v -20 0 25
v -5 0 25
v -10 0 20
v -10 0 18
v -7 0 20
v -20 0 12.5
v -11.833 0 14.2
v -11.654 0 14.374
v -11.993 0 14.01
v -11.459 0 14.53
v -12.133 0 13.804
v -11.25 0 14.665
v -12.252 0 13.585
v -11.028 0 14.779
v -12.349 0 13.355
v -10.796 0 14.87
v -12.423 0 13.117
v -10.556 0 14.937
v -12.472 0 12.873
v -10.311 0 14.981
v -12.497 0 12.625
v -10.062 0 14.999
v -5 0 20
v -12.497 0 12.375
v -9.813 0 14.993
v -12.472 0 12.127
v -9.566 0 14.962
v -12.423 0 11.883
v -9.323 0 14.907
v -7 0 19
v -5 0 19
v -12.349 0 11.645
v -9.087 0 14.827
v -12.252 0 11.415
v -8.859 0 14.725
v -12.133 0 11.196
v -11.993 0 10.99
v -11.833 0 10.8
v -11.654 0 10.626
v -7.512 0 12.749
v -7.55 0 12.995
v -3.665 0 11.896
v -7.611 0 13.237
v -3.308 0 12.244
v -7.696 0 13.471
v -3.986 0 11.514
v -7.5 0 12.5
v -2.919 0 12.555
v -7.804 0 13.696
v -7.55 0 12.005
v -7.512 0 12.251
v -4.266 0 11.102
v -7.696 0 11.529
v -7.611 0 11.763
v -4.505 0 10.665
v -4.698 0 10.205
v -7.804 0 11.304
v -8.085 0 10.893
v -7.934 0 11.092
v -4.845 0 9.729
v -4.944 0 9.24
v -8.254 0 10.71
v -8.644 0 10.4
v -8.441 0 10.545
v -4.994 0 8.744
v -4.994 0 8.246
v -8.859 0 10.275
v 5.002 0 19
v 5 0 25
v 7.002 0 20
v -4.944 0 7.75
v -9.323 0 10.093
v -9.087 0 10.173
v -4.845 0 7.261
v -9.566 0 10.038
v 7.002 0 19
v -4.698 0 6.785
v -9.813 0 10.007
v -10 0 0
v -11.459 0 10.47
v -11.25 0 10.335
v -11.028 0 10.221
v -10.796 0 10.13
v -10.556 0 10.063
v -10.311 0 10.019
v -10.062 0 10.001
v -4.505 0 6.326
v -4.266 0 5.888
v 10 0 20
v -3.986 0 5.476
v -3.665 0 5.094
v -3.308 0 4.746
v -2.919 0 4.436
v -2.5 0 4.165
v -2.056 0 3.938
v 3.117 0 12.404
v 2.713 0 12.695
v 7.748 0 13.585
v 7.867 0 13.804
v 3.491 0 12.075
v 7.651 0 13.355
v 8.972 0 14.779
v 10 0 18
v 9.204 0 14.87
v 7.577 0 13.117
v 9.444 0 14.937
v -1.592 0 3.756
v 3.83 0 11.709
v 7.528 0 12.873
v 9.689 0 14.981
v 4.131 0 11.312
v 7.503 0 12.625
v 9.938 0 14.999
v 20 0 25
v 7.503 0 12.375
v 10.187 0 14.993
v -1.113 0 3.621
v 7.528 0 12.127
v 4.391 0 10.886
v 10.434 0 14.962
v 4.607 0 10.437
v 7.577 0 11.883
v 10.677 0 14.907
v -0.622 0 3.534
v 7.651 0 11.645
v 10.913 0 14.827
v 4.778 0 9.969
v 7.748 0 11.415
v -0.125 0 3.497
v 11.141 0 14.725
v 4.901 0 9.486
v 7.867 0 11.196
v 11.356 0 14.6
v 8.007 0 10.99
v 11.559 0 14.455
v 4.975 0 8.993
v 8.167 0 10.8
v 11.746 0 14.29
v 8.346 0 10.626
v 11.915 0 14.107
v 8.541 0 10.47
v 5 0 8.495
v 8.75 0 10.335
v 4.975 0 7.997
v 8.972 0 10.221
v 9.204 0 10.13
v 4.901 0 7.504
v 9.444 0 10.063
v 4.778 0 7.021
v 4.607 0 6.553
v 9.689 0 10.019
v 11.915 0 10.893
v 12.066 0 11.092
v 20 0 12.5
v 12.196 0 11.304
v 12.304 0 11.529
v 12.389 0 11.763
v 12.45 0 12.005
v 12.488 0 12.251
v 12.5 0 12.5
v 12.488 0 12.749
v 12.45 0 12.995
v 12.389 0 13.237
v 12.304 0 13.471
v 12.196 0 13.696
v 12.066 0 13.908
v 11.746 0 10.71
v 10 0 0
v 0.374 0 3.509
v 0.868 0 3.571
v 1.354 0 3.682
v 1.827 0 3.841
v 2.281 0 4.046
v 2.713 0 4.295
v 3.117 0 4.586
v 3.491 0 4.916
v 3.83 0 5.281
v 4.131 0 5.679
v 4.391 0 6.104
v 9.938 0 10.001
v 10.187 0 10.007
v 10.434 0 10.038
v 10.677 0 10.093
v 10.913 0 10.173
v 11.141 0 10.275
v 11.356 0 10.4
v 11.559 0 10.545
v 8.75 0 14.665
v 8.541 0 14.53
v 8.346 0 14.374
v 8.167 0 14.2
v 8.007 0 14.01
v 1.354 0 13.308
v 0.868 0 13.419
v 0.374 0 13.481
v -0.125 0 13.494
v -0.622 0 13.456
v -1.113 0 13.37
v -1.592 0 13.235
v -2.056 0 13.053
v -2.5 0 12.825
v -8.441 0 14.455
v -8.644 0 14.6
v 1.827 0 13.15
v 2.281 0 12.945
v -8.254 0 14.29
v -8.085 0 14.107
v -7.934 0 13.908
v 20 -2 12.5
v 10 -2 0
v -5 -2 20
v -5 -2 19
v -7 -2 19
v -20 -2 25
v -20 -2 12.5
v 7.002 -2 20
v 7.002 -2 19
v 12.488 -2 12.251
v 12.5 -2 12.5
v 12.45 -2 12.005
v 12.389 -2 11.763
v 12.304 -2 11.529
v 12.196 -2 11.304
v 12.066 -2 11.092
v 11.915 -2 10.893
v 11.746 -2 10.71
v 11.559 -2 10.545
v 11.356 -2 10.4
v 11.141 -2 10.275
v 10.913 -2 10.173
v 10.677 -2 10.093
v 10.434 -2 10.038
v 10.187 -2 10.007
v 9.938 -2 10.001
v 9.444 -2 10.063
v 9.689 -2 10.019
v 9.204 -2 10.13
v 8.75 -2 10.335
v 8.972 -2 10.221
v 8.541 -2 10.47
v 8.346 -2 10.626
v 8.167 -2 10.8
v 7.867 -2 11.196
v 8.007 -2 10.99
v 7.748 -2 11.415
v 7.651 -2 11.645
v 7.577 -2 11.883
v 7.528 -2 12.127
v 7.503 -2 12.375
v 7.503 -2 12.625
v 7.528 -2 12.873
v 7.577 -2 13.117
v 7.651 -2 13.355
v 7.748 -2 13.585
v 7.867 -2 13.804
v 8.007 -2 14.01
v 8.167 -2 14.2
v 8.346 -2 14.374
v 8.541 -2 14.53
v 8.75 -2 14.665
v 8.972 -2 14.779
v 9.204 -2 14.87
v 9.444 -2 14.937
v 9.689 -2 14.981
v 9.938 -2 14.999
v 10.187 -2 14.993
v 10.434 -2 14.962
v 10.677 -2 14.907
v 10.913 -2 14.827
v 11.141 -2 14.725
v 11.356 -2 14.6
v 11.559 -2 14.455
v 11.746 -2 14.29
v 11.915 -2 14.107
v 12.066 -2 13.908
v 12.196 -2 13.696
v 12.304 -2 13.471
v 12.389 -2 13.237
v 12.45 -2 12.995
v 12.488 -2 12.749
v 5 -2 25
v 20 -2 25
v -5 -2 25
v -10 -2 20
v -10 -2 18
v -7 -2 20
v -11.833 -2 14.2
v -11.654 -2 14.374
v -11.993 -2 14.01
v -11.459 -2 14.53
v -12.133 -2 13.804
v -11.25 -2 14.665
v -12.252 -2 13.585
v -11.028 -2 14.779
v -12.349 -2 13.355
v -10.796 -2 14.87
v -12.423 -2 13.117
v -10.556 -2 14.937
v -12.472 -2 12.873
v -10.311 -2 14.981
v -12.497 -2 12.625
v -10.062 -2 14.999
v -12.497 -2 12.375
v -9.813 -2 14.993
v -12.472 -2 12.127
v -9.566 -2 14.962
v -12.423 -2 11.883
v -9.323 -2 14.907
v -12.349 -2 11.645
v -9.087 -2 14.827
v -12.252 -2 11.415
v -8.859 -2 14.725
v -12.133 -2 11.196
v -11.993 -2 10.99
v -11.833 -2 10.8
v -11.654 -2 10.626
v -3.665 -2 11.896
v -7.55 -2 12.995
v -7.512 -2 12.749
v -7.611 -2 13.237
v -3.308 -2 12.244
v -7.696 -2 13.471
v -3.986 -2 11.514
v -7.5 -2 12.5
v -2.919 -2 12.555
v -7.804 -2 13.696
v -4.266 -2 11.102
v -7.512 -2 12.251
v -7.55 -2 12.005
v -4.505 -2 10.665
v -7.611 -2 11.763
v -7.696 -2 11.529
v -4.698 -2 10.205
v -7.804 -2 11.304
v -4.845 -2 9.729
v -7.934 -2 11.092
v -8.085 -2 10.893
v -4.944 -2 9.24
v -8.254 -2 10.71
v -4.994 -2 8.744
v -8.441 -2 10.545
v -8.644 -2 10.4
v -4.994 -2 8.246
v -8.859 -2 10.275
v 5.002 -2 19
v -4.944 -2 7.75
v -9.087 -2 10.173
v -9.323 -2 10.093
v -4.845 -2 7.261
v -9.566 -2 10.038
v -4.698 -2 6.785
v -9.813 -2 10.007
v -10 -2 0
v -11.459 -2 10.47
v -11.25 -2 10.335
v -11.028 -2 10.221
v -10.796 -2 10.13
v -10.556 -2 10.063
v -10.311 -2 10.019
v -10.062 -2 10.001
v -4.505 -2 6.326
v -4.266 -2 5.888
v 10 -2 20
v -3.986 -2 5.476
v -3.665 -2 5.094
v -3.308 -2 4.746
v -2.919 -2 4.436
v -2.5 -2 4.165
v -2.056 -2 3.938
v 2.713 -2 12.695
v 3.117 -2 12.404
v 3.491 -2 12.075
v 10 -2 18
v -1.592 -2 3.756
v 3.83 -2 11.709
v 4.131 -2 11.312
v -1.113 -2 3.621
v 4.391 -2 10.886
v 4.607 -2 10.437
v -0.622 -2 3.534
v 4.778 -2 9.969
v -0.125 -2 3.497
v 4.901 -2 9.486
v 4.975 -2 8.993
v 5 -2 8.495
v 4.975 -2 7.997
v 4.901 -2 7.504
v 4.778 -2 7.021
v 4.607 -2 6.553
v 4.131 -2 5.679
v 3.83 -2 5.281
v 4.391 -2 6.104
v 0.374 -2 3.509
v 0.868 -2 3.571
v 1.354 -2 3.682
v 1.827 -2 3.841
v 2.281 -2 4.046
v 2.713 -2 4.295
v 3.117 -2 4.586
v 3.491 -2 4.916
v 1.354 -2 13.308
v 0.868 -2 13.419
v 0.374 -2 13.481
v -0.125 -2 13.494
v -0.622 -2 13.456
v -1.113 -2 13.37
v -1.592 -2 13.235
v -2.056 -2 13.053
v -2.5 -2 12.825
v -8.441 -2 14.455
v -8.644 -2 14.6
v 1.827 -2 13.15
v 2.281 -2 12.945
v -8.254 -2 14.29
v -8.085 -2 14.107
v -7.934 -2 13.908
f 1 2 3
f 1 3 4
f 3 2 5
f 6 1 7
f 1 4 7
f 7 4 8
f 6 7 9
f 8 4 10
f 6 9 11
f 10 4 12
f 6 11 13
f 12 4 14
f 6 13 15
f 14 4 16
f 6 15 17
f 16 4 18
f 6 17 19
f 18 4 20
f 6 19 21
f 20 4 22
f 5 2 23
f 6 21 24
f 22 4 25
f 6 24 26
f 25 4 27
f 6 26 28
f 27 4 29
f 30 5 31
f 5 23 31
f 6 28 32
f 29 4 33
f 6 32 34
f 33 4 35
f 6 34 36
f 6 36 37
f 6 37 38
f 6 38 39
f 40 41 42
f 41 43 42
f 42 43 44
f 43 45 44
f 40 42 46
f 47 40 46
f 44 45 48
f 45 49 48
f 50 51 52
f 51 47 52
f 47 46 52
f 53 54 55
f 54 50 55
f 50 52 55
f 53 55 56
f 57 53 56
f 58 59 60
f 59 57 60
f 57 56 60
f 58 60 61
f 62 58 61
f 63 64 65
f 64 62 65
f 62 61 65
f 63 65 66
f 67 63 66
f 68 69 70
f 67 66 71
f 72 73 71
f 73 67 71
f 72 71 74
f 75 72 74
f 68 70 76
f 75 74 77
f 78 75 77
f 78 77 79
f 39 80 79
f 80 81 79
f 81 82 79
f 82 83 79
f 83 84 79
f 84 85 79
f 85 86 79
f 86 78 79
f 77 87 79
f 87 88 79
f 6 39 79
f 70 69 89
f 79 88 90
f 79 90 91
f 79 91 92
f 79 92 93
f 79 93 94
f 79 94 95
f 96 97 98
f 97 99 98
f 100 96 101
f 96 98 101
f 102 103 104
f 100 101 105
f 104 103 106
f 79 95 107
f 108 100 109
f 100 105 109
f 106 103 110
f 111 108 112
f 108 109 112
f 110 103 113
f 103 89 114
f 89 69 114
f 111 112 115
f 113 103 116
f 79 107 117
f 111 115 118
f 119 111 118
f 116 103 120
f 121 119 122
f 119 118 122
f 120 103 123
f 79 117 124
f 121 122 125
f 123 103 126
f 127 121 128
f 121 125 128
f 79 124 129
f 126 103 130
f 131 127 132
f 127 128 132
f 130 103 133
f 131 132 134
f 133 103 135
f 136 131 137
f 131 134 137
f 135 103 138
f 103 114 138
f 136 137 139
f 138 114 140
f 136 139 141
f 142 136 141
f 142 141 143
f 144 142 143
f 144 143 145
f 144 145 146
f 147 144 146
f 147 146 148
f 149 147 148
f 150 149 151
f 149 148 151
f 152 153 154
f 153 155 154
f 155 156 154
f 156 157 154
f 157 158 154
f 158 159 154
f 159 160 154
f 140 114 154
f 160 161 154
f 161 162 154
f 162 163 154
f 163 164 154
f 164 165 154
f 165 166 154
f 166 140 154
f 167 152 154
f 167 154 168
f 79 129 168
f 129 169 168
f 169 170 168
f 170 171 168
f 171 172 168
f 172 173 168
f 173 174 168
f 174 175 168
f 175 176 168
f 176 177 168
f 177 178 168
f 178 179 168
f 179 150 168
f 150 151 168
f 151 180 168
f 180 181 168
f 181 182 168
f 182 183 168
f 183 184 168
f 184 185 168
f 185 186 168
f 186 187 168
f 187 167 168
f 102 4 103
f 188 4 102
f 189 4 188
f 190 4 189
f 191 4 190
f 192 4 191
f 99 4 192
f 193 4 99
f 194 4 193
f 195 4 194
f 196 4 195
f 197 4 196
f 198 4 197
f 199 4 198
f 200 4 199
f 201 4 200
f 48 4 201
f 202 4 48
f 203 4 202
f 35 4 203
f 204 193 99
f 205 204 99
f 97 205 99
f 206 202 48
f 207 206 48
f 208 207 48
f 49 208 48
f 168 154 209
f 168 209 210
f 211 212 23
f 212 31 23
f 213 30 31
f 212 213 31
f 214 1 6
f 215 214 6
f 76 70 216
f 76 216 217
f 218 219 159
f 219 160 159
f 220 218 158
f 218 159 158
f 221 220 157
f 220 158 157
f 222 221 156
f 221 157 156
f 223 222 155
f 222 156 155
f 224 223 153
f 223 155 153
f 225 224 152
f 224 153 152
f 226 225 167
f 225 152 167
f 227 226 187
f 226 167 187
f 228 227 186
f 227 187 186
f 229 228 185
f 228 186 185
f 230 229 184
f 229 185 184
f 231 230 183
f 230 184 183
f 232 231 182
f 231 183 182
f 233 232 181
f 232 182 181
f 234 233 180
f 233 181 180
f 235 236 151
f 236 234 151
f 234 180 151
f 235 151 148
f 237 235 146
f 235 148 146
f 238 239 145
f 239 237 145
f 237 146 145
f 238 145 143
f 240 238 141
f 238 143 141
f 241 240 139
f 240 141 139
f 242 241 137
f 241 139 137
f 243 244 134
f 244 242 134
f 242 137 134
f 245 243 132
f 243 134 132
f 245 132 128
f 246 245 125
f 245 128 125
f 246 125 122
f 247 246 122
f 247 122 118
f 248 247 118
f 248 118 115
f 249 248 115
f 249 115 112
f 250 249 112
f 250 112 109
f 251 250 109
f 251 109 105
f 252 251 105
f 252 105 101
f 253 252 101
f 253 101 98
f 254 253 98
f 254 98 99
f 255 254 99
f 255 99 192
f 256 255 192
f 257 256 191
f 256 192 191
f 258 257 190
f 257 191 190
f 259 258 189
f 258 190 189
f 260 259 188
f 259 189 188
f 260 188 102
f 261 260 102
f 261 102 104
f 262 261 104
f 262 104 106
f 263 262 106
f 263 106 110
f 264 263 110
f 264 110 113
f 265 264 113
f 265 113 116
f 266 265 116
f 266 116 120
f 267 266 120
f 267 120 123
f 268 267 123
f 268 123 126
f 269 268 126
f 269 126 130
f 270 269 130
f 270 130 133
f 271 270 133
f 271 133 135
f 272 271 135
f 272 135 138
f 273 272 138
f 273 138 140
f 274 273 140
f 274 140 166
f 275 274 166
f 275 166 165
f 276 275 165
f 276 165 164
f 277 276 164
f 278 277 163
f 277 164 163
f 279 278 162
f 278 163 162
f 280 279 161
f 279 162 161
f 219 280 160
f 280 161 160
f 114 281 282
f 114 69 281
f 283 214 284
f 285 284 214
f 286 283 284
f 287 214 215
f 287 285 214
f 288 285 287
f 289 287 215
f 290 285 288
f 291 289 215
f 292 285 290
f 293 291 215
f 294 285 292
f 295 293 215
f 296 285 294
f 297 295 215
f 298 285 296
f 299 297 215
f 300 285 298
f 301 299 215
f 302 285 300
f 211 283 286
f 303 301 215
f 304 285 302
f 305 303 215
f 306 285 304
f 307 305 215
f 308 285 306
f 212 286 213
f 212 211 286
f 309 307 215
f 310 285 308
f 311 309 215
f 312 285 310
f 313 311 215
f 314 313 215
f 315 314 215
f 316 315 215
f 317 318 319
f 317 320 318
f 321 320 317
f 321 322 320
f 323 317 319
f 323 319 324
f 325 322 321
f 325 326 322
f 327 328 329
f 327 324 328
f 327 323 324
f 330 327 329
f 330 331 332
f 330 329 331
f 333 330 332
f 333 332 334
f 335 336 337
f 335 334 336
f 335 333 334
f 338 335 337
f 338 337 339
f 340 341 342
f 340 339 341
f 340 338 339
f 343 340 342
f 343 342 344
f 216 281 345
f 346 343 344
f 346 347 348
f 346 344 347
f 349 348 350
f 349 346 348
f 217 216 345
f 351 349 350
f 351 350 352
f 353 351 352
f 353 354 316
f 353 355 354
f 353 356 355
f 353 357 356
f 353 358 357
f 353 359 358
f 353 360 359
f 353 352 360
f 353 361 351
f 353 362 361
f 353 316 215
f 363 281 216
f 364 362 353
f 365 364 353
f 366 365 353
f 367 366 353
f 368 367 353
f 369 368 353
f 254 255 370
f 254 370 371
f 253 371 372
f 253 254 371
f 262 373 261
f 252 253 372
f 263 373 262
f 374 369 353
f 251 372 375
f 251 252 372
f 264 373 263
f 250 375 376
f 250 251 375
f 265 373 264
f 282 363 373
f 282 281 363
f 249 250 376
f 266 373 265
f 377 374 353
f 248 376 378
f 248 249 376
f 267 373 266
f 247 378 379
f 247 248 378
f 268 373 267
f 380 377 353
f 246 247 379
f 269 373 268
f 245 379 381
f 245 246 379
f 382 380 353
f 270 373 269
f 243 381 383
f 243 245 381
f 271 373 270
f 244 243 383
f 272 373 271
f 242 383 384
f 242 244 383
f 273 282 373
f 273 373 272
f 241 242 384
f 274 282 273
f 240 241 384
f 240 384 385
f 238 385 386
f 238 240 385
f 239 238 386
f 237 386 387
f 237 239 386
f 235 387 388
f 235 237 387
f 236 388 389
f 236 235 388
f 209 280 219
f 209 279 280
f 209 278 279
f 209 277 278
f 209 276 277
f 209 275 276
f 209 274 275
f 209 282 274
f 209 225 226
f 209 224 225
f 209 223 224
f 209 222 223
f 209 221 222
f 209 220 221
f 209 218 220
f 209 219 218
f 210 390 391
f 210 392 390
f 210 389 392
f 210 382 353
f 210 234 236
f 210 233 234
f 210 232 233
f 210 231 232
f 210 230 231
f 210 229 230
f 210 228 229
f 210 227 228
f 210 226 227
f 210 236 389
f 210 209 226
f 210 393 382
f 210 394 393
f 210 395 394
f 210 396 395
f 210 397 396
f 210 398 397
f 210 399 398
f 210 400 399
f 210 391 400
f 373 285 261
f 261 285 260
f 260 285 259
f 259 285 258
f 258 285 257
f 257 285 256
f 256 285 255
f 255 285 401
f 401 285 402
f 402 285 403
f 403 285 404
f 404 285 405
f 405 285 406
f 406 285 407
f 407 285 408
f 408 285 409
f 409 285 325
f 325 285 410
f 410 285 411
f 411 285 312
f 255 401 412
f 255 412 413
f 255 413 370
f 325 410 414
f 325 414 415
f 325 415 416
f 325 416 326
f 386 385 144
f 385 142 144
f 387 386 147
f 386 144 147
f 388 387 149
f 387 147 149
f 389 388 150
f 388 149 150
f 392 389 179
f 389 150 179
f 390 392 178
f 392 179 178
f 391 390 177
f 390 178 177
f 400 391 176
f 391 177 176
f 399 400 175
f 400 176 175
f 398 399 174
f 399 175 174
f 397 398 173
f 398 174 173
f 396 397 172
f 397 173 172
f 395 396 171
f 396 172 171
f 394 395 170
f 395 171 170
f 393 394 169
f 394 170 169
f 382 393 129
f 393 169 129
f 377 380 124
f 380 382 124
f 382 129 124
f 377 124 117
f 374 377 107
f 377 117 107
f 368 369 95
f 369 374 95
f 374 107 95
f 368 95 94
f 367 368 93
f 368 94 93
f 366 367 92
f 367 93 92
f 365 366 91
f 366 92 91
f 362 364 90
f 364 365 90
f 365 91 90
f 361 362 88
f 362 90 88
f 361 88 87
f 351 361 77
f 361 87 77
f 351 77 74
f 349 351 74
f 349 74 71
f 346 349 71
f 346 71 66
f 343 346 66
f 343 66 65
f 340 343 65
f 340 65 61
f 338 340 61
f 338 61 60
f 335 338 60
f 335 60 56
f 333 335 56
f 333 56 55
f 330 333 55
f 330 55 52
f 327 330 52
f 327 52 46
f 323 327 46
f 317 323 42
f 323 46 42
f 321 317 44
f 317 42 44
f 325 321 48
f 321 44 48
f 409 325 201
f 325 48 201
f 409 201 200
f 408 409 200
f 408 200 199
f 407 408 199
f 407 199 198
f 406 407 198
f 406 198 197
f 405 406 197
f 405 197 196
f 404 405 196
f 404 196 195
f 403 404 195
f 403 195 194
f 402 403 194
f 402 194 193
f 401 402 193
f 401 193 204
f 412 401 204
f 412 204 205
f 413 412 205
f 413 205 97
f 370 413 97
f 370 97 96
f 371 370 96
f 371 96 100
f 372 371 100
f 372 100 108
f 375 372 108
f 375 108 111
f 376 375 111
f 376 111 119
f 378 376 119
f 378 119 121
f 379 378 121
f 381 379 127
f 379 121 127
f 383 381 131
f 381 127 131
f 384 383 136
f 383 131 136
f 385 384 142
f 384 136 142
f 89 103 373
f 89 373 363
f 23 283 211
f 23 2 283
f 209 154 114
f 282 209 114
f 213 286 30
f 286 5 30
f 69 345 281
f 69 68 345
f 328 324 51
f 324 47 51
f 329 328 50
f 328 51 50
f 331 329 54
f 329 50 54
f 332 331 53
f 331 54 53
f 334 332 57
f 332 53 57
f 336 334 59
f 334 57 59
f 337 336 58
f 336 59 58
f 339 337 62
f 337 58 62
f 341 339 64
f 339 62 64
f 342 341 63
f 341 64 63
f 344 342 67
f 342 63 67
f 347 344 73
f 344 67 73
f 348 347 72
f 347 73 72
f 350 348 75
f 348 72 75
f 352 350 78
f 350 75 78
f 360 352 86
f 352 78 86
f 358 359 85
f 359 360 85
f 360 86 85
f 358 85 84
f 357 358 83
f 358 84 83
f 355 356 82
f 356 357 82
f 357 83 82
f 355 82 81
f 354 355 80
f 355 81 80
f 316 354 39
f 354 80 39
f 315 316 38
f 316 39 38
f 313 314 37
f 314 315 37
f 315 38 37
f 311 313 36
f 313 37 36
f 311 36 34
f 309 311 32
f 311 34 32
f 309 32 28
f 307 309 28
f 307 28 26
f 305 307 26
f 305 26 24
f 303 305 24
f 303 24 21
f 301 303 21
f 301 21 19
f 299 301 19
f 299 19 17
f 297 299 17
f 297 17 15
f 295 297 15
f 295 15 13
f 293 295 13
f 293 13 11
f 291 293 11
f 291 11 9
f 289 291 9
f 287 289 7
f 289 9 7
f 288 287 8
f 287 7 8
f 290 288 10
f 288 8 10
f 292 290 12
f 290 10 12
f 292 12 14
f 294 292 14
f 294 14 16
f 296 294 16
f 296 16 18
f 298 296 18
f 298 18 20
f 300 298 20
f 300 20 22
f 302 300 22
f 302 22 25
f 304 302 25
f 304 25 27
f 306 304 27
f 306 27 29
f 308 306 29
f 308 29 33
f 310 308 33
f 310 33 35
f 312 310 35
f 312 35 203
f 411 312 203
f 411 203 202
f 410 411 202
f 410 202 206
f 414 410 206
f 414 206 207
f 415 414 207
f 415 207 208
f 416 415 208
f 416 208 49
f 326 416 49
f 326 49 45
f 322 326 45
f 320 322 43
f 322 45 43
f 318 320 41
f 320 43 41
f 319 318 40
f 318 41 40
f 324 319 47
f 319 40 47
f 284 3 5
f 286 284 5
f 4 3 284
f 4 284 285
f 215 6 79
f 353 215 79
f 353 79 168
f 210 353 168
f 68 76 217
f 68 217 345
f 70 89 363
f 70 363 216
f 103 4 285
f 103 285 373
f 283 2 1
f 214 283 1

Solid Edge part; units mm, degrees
sketch "Sketch1" plane through (0, 0, 0) normal (0, -1, 0) x (1, 0, 0)
  line L0 (20, 12.5) -> (20, 25)
  line L1 (5, 25) -> (20, 25)
  line L2 (5.0015, 19) -> (5, 25)
  line L3 (7.0015, 19) -> (5.0015, 19)
  line L4 (7.0015, 20) -> (7.0015, 19)
  line L5 (10, 20) -> (7.0015, 20)
  line L6 (10, 18) -> (10, 20)
  line L7 (-10, 18) -> (10, 18)
  line L8 (-10, 20) -> (-10, 18)
  line L9 (-10, 20) -> (-7, 20)
  line L10 (-7, 20) -> (-7, 19)
  line L11 (-7, 19) -> (-5, 19)
  line L12 (-5, 19) -> (-5, 20)
  line L13 (-5, 25) -> (-5, 20)
  line L14 (-5, 25) -> (-20, 25)
  line L15 (-20, 25) -> (-20, 12.5)
  line L16 (-20, 12.5) -> (-10, 0)
  line L17 (-10, 0) -> (-10, 0) construction
  line L18 (-10, 0) -> (10, 0)
  line L19 (10, 0) -> (10, 0) construction
  line L20 (20, 12.5) -> (10, 0)
  circle A0 centre (0, 8.4952) radius 5
  circle A1 centre (10, 12.5) radius 2.5
  circle A2 centre (-10, 12.5) radius 2.5
  dimension "D1" = 10
  dimension "D2" = 5
  dimension "D3" = 5
  dimension "D4" = 3
  dimension "D5" = 1
  dimension "D6" = 2
  dimension "D7" = 1
extrude "ExtrudedProtrusion_1" add sketch "Sketch1" along normal blind 2
properties material "Acrylic, high impact grade"
